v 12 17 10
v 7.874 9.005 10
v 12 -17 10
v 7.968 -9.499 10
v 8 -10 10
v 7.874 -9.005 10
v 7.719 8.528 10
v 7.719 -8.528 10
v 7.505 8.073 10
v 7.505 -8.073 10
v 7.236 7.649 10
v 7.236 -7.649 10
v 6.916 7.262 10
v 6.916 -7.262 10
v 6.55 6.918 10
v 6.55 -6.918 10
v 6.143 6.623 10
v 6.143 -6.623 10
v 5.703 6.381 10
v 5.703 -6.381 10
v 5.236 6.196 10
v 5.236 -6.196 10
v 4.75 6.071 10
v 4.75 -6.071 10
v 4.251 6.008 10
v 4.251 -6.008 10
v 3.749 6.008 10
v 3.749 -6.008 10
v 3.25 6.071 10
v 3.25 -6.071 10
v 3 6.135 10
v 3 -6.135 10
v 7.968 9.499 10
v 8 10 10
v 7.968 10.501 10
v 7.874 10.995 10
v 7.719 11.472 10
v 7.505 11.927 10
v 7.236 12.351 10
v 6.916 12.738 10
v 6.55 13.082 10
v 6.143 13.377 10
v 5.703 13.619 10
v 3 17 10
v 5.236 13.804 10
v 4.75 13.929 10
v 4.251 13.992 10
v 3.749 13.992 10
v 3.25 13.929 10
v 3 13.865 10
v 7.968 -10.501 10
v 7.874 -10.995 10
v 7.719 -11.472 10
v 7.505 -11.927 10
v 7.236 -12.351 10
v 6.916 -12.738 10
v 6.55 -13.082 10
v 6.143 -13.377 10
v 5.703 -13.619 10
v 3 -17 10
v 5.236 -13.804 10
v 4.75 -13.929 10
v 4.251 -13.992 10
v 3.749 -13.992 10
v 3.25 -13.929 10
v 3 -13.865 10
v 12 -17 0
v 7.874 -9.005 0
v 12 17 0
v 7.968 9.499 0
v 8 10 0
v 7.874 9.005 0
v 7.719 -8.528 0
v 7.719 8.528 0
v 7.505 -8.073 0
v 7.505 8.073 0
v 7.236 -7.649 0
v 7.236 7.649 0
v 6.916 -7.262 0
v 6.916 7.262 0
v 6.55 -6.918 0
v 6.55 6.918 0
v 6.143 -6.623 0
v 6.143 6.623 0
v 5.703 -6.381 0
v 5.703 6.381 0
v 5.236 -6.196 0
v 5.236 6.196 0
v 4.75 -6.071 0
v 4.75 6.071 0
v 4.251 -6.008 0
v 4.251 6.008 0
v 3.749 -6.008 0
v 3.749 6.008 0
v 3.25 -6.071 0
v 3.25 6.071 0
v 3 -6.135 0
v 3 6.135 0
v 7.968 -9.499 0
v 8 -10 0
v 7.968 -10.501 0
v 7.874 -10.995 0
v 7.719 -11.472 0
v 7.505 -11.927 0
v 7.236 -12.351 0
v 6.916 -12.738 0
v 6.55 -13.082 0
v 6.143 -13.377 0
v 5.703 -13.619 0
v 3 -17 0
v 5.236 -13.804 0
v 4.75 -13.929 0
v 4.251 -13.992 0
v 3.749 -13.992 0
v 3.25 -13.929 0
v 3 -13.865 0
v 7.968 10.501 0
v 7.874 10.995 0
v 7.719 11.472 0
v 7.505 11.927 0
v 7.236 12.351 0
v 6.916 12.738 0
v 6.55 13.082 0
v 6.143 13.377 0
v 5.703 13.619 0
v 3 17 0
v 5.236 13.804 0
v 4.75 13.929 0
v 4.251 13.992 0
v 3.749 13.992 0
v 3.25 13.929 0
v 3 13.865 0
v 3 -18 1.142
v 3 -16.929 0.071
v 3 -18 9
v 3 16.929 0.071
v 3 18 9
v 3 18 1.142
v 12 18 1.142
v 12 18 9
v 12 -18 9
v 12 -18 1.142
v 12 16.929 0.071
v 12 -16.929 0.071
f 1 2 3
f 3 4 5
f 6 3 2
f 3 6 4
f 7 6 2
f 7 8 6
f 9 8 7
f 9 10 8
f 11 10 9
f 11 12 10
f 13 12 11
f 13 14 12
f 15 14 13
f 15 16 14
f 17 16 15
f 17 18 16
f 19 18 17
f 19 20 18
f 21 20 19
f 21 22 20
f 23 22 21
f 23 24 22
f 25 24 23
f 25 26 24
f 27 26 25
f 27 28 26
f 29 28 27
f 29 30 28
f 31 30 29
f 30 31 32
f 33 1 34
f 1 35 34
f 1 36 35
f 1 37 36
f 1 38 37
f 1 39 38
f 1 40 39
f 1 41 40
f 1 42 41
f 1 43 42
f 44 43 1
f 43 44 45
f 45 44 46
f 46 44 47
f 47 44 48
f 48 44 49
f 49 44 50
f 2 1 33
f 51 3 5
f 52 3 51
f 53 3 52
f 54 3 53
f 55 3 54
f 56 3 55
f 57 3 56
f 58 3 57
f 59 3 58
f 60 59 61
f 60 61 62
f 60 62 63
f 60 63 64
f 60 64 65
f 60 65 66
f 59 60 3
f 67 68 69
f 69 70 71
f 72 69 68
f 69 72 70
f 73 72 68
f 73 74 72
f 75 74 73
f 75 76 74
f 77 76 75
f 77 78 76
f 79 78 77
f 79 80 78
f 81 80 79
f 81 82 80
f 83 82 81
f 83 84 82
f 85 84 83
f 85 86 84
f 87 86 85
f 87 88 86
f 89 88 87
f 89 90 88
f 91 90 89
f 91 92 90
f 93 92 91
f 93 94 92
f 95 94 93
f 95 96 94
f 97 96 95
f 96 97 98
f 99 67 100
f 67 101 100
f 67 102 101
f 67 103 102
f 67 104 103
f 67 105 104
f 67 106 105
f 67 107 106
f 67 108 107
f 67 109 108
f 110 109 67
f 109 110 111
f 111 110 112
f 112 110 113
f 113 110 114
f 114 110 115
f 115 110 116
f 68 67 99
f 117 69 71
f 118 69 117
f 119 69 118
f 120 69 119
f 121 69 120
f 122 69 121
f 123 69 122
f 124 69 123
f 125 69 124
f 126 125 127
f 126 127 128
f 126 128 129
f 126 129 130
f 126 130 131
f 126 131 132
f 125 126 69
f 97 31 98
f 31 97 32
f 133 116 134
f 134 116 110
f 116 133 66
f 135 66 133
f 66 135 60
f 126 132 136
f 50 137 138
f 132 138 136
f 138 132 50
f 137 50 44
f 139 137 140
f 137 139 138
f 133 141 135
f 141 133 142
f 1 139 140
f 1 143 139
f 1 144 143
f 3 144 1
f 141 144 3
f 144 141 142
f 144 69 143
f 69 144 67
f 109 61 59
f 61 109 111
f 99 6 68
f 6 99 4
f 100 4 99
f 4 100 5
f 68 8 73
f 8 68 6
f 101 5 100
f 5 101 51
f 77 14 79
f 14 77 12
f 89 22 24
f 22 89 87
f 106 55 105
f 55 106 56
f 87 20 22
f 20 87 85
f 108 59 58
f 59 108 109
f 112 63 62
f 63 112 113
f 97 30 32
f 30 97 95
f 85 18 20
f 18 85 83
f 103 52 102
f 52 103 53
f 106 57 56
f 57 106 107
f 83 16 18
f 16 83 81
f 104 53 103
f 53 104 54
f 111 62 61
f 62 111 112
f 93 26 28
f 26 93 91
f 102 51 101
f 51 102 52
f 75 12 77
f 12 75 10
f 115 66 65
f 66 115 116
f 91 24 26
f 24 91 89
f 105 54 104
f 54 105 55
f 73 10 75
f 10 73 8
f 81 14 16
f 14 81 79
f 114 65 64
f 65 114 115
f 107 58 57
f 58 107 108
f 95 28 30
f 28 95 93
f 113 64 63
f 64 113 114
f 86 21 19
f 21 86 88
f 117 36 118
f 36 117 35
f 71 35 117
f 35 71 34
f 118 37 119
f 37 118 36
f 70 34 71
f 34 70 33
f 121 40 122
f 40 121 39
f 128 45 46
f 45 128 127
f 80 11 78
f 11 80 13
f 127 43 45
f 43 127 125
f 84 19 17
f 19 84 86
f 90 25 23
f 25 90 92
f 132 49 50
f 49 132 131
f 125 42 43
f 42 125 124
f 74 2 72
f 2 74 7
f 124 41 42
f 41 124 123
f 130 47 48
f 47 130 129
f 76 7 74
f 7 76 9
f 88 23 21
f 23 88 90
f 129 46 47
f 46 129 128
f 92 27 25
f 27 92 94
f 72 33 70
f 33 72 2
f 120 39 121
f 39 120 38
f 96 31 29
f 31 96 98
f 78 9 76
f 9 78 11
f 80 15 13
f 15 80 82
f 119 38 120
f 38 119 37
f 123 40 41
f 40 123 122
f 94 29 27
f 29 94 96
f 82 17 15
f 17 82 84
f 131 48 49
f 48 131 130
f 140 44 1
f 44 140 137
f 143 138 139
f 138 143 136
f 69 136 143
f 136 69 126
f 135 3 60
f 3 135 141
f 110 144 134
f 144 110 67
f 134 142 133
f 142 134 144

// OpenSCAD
//Carbon i3 Modified

// PRUSA iteration3
// GNU GPL v3
// Josef Průša <iam@josefprusa.cz> and contributors
// http://www.reprap.org/wiki/Prusa_Mendel
// http://prusamendel.org

difference()
{

//body    
union()
{
    translate([3,-18,0]) cube([5,36,10]);
    translate([8,-18,0]) cube([4,36,10]);
}


union()
{
    //rods
    translate(v = [4,-10,-1]) cylinder(h = 12, r=4, $fn=50);	
    translate(v = [4,10,-1]) cylinder(h = 12, r=4, $fn=50);
    //cables
    //translate([10,5,3]) cube([8,9,10]);
}

        //corners
        translate([-5,24,3]) rotate([45,0,0]) cube([20,10,10]);
        translate([-5,24,-7]) rotate([45,0,0]) cube([20,10,10]);
        translate([-5,-24,3]) rotate([45,0,0]) cube([20,10,10]);
        translate([-5,-24,-7]) rotate([45,0,0]) cube([20,10,10]);
}
